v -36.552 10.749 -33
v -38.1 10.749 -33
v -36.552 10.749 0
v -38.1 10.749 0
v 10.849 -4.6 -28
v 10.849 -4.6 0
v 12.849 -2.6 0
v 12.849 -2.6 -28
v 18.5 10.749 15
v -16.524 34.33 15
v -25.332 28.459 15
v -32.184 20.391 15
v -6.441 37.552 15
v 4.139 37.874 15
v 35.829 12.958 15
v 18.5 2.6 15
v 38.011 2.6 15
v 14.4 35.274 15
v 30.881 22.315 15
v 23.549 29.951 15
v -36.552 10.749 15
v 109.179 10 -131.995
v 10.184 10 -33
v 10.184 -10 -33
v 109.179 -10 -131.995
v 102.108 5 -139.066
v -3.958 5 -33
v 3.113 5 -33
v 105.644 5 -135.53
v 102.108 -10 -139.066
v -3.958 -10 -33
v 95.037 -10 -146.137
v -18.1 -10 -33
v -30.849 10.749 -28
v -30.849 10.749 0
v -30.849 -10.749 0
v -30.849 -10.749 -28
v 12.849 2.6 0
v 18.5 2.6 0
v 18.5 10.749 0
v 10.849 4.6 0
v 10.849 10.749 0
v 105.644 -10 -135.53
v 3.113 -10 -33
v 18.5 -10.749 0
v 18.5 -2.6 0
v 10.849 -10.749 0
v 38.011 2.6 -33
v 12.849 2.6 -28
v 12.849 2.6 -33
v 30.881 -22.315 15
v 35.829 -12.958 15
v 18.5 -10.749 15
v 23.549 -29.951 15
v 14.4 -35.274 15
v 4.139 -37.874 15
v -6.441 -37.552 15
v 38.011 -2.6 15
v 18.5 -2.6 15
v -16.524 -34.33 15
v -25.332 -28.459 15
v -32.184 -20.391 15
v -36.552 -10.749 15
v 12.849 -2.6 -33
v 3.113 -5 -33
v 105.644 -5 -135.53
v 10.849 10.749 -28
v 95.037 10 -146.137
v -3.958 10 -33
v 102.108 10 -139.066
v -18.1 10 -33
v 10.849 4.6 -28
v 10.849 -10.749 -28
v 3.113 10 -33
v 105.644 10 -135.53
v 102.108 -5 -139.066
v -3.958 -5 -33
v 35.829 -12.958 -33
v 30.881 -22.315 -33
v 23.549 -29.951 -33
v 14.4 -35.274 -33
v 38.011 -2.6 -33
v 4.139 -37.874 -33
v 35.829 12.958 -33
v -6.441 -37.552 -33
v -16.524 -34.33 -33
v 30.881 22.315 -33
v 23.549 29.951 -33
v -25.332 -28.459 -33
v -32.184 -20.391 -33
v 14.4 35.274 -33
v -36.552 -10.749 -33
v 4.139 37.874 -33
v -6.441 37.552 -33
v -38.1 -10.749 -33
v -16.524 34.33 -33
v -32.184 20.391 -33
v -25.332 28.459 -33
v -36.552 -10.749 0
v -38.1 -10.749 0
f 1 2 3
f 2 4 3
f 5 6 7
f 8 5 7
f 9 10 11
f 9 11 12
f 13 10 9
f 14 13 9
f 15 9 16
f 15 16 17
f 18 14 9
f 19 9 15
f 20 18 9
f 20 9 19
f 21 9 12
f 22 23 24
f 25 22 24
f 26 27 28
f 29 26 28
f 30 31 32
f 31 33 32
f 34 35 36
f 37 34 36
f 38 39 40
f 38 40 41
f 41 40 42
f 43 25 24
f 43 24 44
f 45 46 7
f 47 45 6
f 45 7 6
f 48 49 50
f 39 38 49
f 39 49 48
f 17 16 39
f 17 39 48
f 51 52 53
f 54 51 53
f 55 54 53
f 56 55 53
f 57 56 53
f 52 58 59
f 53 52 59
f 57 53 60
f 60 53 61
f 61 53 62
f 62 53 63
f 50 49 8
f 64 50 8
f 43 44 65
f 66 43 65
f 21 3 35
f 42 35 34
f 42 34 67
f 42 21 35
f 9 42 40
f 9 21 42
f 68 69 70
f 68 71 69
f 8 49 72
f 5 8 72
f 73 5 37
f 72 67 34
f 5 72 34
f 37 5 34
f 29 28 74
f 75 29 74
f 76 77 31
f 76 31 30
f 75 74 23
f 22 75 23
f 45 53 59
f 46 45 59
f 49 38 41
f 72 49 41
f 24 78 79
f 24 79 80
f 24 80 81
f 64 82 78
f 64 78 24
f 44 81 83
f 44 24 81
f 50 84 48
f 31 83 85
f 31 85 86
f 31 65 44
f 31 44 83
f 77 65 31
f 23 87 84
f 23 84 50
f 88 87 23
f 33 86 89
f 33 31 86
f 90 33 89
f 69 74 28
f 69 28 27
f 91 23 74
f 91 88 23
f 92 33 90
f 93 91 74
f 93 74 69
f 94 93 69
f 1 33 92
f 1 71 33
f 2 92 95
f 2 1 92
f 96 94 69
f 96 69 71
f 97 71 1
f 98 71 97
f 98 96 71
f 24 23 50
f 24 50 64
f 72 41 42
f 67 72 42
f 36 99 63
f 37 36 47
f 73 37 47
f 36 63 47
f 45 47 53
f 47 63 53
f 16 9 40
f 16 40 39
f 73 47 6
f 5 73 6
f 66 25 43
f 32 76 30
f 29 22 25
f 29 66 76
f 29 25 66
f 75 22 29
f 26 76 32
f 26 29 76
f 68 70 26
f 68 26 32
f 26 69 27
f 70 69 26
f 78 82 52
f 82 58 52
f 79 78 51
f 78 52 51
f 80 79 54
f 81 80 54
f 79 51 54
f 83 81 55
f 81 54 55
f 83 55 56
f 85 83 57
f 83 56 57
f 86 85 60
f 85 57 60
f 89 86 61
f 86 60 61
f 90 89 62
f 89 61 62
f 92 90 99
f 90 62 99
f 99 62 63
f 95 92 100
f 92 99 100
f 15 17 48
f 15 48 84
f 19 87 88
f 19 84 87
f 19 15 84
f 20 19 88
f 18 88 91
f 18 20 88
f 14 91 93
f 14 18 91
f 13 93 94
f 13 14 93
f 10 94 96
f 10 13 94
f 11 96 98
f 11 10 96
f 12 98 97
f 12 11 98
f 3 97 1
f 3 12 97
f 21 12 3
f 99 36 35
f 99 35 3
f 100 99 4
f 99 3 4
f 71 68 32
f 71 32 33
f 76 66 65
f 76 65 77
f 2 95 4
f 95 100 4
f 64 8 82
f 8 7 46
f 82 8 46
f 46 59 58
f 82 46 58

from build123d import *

# Parameters (mm, degrees)
BOSS_EXTRUDE1_DEPTH = 28
BOSS_EXTRUDE5_DEPTH = 5
BOSS_EXTRUDE6_DEPTH = 10
BOSS_EXTRUDE7_REACH = 204.915
BOSS_EXTRUDE8_START = 15
BOSS_EXTRUDE8_DEPTH = 15


with BuildPart() as part:
    # Sketch3 → Boss-Extrude1 (new body)
    with BuildSketch(Plane.XY):
        with BuildLine():
            Line((10.849101299, -10.749101299), (10.849101299, -4.6))
            Line((10.849101299, -4.6), (12.849101299, -2.6))
            Line((12.849101299, -2.6), (38.011182565, -2.6))
            ThreePointArc((38.011182565, -2.6), (4.13933396, -37.874475764), (-36.552247828, -10.749101299))
            Line((-36.552247828, -10.749101299), (-38.1, -10.749101299))
            Line((-38.1, -10.749101299), (-38.1, 10.749101299))
            Line((-38.1, 10.749101299), (-36.552247828, 10.749101299))
            ThreePointArc((-36.552247828, 10.749101299), (4.13933396, 37.874475764), (38.011182565, 2.6))
            Line((38.011182565, 2.6), (12.849101299, 2.6))
            Line((12.849101299, 2.6), (10.849101299, 4.6))
            Line((10.849101299, 4.6), (10.849101299, 10.749101299))
            Line((10.849101299, 10.749101299), (-30.849101299, 10.749101299))
            Line((-30.849101299, 10.749101299), (-30.849101299, -10.749101299))
            Line((-30.849101299, -10.749101299), (10.849101299, -10.749101299))
        make_face()
    extrude(amount=-BOSS_EXTRUDE1_DEPTH)

    # Sketch7 → Boss-Extrude5 (add)
    with BuildSketch(Plane(origin=(0, 0, -28), x_dir=(-1, 0, 0), z_dir=(0, 0, -1))):
        with BuildLine():
            Line((-12.849101299, 2.6), (-12.849101299, -2.6))
            Line((-12.849101299, -2.6), (-38.011182565, -2.6))
            ThreePointArc((-38.011182565, -2.6), (-4.13933396, -37.874475764), (36.552247828, -10.749101299))
            Line((36.552247828, -10.749101299), (38.1, -10.749101299))
            Line((38.1, -10.749101299), (38.1, 10.749101299))
            Line((38.1, 10.749101299), (36.552247828, 10.749101299))
            ThreePointArc((36.552247828, 10.749101299), (-4.13933396, 37.874475764), (-38.011182565, 2.6))
            Line((-38.011182565, 2.6), (-12.849101299, 2.6))
        make_face()
    extrude(amount=BOSS_EXTRUDE5_DEPTH)

    # Sketch8 → Boss-Extrude6 (add, symmetric)
    with BuildSketch(Plane(origin=(0, 0, 0), x_dir=(1, 0, 0), z_dir=(0, 1, 0))):
        Polygon((-3.957864376, 33), (102.108152802, 139.066017178), (95.03708499, 146.13708499), (-18.1, 33), align=None)
    extrude(amount=BOSS_EXTRUDE6_DEPTH, both=True)

    # Boss-Extrude7: up to this plane
    boss_extrude7_end = Plane(origin=(0, 0, -33), z_dir=(0, 0, -1))
    # Sketch9 → Boss-Extrude7 (add, up to the surface)
    with BuildSketch(Plane(origin=(120.58708499, 0, -120.58708499), x_dir=(-0.70710678118655, 0, -0.7071067811865451), z_dir=(0.7071067811865451, 0, -0.70710678118655)), mode=Mode.PRIVATE) as boss_extrude7_sk1:
        Polygon((26.133156519, 5), (21.133156519, 5), (21.133156519, 10), (16.133156519, 10), (16.133156519, -10), (21.133156519, -10), (21.133156519, -5), (26.133156519, -5), align=None)
    boss_extrude7_tool1 = split(extrude(boss_extrude7_sk1.sketch, amount=-BOSS_EXTRUDE7_REACH, mode=Mode.PRIVATE), bisect_by=boss_extrude7_end, keep=Keep.BOTH, mode=Mode.PRIVATE)
    add(boss_extrude7_tool1.solids().sort_by_distance((106.232942, 0, -134.941228))[0])

    # Sketch12 → Boss-Extrude8 (add)
    with BuildSketch(Plane.XY.offset(BOSS_EXTRUDE8_START)):
        with BuildLine():
            Line((-36.552247828, 10.749101299), (18.5, 10.749101299))
            Line((18.5, 10.749101299), (18.5, 2.6))
            Line((18.5, 2.6), (38.011182565, 2.6))
            ThreePointArc((38.011182565, 2.6), (4.13933396, 37.874475764), (-36.552247828, 10.749101299))
        make_face()
        with BuildLine():
            Line((-36.552247828, -10.749101299), (18.5, -10.749101299))
            Line((18.5, -10.749101299), (18.5, -2.6))
            Line((18.5, -2.6), (38.011182565, -2.6))
            ThreePointArc((38.011182565, -2.6), (4.13933396, -37.874475764), (-36.552247828, -10.749101299))
        make_face()
    extrude(amount=-BOSS_EXTRUDE8_DEPTH)


solid = part.part
